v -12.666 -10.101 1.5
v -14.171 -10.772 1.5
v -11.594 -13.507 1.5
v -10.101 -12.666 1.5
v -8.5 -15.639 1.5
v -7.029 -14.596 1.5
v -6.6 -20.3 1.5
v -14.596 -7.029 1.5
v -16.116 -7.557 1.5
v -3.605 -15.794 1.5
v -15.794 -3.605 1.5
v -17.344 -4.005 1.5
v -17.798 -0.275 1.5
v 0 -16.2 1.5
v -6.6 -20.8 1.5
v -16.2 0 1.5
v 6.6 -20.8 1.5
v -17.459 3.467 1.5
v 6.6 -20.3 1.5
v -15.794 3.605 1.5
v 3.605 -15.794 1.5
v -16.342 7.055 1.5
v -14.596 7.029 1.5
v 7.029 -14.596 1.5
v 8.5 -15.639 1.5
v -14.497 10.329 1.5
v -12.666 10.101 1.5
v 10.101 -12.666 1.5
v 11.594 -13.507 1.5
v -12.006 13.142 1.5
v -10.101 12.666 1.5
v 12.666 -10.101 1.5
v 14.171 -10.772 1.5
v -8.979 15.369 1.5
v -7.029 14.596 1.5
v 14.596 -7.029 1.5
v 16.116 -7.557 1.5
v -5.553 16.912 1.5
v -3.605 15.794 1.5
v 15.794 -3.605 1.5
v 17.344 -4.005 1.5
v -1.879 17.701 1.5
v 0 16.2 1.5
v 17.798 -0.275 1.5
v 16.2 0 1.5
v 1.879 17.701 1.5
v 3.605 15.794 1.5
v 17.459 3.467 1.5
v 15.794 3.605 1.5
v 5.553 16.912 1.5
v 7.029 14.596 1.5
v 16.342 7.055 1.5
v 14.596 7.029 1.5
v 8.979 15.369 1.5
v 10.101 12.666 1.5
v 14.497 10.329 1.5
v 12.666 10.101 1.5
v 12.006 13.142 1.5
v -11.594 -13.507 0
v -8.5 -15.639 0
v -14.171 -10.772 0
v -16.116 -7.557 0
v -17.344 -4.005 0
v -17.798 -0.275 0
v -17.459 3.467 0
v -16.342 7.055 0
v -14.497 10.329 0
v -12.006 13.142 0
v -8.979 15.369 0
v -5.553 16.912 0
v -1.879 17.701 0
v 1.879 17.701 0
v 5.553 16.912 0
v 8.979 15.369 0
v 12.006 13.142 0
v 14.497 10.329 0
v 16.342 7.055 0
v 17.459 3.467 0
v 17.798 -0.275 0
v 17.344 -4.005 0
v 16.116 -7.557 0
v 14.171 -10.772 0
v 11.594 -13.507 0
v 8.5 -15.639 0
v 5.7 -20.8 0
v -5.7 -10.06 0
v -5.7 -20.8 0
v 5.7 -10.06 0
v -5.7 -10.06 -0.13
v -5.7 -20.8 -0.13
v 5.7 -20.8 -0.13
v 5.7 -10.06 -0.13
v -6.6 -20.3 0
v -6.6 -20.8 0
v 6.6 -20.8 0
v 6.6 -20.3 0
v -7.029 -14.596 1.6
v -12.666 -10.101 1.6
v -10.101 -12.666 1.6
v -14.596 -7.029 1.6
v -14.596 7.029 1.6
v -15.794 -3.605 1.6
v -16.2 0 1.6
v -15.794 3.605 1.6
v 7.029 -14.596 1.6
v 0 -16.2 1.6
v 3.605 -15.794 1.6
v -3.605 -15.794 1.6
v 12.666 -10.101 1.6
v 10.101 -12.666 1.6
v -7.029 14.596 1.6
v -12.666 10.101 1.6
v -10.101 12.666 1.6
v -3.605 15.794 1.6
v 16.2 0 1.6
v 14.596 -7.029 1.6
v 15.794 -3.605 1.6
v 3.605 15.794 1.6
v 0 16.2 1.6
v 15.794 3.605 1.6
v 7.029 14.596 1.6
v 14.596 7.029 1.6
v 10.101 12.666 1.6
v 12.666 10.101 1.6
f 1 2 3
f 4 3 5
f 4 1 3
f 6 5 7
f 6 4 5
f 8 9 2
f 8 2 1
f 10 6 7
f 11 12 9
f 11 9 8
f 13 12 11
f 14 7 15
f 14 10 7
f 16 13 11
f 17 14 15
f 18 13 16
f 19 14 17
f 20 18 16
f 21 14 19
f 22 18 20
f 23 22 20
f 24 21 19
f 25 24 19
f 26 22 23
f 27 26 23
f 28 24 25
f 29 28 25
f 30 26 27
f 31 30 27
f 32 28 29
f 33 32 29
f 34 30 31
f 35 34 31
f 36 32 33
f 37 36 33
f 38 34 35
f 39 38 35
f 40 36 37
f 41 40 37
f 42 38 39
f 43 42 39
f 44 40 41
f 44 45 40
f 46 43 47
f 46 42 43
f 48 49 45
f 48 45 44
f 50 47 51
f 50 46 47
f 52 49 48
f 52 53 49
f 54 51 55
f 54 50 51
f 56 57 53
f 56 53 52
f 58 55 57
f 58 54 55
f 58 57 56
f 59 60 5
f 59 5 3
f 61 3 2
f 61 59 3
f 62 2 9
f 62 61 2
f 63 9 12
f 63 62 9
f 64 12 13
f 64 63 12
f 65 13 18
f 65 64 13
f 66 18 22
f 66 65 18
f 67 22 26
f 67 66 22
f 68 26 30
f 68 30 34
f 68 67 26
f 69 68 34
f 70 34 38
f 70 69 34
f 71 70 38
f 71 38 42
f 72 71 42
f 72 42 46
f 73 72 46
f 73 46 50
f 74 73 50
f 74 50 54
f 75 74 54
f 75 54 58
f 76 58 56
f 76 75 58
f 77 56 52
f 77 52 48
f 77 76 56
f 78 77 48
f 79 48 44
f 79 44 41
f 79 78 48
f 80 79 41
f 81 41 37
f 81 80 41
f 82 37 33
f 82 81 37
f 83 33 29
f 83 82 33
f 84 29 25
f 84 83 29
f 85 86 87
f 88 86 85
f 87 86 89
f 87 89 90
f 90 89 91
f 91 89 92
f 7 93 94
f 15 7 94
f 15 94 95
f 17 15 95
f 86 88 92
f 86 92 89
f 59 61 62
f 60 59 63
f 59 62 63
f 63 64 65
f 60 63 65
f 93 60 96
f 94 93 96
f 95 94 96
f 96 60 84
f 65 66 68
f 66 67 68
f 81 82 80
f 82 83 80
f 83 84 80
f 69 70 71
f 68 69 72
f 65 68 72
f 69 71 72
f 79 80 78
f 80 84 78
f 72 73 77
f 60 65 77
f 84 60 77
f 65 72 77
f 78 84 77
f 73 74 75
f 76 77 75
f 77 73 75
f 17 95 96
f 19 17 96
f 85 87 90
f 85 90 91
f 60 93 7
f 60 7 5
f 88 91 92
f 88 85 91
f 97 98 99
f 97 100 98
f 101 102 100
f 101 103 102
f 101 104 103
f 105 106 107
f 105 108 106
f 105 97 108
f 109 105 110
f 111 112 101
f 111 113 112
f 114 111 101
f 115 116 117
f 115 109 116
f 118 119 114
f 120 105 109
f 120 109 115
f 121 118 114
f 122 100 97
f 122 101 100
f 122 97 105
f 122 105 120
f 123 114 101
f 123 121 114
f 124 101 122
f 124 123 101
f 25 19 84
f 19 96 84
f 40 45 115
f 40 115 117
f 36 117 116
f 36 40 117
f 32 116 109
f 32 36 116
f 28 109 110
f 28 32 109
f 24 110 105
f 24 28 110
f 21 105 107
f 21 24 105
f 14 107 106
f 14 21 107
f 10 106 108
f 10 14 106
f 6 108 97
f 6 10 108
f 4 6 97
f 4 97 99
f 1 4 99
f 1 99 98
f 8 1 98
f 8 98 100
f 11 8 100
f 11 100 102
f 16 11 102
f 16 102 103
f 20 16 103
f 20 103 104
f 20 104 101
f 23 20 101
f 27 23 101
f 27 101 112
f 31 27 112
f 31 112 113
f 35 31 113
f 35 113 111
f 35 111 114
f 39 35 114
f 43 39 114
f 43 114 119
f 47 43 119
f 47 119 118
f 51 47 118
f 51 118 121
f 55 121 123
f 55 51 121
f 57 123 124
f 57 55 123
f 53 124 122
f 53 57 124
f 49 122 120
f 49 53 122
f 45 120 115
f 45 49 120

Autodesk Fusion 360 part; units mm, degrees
sketch "Sketch1" plane through (0, 0, 0) normal (0, 0, 1) x (1, 0, 0)
  circle A0 centre (0, 0) radius 16.2
  circle A1 centre (0, 0) radius 17.37 construction
  circle A2 centre (0, 0) radius 17.6 construction
  circle A3 centre (0, 0) radius 17.8
  line L0 (0, 0) -> (0, -34.4204) construction
  line L1 (-6.6, -20.3) -> (6.6, -20.3)
  line L2 (8.5, -15.6394) -> (-8.5, -15.6394) construction
  line L3 (6.6, -20.3) -> (8.5, -15.6394)
  line L4 (-6.6, -20.3) -> (-8.5, -15.6394)
  line L5 (-6.6, -20.3) -> (-6.6, -20.8)
  line L6 (-6.6, -20.8) -> (6.6, -20.8)
  line L7 (6.6, -20.8) -> (6.6, -20.3)
  circle A4 centre (0, 0) radius 22.5 construction
  line L8 (-5.7, -20.8) -> (5.7, -20.8)
  line L9 (5.7, -20.8) -> (5.7, -10.06)
  line L10 (5.7, -10.06) -> (-5.7, -10.06)
  line L11 (-5.7, -10.06) -> (-5.7, -20.8)
  point P0 (0, -20.3)
  dimension "d1" = 32.4
  dimension "d2" = 34.74
  dimension "d3" = 35.2
  dimension "d4" = 35.6
  dimension "d5" = 13.2
  dimension "d6" = 20.3
  dimension "d7" = 17
  dimension "d8" = 0.5
  dimension "d9" = 21.822
  dimension "d10" = 45
  dimension "d11" = 0.678
  dimension "d24" = 11.4
  dimension "d25" = 10.24
extrude "Extrude2" add sketch "Sketch1" along normal blind 1.5 makes body 1
extrude "Extrude4" add sketch "Sketch1" along normal blind 0.1 from surface at 1.5 contours A0 L9 L10 L11 | A0 L9 L10 L11 bodies 1
extrude "Extrude5" add sketch "Sketch1" against normal blind 0.13 separate body contours A0 L9 L10 L11 | A0 A3 L9 L11 | A3 L1 L9 L11 | L1 L6 L8 L9 L11 picked at (0.388, -12.0927) picked at (-4.9559, -15.9504) makes body 2
equation "d6 = 38.1 mm - d4 / 2"
